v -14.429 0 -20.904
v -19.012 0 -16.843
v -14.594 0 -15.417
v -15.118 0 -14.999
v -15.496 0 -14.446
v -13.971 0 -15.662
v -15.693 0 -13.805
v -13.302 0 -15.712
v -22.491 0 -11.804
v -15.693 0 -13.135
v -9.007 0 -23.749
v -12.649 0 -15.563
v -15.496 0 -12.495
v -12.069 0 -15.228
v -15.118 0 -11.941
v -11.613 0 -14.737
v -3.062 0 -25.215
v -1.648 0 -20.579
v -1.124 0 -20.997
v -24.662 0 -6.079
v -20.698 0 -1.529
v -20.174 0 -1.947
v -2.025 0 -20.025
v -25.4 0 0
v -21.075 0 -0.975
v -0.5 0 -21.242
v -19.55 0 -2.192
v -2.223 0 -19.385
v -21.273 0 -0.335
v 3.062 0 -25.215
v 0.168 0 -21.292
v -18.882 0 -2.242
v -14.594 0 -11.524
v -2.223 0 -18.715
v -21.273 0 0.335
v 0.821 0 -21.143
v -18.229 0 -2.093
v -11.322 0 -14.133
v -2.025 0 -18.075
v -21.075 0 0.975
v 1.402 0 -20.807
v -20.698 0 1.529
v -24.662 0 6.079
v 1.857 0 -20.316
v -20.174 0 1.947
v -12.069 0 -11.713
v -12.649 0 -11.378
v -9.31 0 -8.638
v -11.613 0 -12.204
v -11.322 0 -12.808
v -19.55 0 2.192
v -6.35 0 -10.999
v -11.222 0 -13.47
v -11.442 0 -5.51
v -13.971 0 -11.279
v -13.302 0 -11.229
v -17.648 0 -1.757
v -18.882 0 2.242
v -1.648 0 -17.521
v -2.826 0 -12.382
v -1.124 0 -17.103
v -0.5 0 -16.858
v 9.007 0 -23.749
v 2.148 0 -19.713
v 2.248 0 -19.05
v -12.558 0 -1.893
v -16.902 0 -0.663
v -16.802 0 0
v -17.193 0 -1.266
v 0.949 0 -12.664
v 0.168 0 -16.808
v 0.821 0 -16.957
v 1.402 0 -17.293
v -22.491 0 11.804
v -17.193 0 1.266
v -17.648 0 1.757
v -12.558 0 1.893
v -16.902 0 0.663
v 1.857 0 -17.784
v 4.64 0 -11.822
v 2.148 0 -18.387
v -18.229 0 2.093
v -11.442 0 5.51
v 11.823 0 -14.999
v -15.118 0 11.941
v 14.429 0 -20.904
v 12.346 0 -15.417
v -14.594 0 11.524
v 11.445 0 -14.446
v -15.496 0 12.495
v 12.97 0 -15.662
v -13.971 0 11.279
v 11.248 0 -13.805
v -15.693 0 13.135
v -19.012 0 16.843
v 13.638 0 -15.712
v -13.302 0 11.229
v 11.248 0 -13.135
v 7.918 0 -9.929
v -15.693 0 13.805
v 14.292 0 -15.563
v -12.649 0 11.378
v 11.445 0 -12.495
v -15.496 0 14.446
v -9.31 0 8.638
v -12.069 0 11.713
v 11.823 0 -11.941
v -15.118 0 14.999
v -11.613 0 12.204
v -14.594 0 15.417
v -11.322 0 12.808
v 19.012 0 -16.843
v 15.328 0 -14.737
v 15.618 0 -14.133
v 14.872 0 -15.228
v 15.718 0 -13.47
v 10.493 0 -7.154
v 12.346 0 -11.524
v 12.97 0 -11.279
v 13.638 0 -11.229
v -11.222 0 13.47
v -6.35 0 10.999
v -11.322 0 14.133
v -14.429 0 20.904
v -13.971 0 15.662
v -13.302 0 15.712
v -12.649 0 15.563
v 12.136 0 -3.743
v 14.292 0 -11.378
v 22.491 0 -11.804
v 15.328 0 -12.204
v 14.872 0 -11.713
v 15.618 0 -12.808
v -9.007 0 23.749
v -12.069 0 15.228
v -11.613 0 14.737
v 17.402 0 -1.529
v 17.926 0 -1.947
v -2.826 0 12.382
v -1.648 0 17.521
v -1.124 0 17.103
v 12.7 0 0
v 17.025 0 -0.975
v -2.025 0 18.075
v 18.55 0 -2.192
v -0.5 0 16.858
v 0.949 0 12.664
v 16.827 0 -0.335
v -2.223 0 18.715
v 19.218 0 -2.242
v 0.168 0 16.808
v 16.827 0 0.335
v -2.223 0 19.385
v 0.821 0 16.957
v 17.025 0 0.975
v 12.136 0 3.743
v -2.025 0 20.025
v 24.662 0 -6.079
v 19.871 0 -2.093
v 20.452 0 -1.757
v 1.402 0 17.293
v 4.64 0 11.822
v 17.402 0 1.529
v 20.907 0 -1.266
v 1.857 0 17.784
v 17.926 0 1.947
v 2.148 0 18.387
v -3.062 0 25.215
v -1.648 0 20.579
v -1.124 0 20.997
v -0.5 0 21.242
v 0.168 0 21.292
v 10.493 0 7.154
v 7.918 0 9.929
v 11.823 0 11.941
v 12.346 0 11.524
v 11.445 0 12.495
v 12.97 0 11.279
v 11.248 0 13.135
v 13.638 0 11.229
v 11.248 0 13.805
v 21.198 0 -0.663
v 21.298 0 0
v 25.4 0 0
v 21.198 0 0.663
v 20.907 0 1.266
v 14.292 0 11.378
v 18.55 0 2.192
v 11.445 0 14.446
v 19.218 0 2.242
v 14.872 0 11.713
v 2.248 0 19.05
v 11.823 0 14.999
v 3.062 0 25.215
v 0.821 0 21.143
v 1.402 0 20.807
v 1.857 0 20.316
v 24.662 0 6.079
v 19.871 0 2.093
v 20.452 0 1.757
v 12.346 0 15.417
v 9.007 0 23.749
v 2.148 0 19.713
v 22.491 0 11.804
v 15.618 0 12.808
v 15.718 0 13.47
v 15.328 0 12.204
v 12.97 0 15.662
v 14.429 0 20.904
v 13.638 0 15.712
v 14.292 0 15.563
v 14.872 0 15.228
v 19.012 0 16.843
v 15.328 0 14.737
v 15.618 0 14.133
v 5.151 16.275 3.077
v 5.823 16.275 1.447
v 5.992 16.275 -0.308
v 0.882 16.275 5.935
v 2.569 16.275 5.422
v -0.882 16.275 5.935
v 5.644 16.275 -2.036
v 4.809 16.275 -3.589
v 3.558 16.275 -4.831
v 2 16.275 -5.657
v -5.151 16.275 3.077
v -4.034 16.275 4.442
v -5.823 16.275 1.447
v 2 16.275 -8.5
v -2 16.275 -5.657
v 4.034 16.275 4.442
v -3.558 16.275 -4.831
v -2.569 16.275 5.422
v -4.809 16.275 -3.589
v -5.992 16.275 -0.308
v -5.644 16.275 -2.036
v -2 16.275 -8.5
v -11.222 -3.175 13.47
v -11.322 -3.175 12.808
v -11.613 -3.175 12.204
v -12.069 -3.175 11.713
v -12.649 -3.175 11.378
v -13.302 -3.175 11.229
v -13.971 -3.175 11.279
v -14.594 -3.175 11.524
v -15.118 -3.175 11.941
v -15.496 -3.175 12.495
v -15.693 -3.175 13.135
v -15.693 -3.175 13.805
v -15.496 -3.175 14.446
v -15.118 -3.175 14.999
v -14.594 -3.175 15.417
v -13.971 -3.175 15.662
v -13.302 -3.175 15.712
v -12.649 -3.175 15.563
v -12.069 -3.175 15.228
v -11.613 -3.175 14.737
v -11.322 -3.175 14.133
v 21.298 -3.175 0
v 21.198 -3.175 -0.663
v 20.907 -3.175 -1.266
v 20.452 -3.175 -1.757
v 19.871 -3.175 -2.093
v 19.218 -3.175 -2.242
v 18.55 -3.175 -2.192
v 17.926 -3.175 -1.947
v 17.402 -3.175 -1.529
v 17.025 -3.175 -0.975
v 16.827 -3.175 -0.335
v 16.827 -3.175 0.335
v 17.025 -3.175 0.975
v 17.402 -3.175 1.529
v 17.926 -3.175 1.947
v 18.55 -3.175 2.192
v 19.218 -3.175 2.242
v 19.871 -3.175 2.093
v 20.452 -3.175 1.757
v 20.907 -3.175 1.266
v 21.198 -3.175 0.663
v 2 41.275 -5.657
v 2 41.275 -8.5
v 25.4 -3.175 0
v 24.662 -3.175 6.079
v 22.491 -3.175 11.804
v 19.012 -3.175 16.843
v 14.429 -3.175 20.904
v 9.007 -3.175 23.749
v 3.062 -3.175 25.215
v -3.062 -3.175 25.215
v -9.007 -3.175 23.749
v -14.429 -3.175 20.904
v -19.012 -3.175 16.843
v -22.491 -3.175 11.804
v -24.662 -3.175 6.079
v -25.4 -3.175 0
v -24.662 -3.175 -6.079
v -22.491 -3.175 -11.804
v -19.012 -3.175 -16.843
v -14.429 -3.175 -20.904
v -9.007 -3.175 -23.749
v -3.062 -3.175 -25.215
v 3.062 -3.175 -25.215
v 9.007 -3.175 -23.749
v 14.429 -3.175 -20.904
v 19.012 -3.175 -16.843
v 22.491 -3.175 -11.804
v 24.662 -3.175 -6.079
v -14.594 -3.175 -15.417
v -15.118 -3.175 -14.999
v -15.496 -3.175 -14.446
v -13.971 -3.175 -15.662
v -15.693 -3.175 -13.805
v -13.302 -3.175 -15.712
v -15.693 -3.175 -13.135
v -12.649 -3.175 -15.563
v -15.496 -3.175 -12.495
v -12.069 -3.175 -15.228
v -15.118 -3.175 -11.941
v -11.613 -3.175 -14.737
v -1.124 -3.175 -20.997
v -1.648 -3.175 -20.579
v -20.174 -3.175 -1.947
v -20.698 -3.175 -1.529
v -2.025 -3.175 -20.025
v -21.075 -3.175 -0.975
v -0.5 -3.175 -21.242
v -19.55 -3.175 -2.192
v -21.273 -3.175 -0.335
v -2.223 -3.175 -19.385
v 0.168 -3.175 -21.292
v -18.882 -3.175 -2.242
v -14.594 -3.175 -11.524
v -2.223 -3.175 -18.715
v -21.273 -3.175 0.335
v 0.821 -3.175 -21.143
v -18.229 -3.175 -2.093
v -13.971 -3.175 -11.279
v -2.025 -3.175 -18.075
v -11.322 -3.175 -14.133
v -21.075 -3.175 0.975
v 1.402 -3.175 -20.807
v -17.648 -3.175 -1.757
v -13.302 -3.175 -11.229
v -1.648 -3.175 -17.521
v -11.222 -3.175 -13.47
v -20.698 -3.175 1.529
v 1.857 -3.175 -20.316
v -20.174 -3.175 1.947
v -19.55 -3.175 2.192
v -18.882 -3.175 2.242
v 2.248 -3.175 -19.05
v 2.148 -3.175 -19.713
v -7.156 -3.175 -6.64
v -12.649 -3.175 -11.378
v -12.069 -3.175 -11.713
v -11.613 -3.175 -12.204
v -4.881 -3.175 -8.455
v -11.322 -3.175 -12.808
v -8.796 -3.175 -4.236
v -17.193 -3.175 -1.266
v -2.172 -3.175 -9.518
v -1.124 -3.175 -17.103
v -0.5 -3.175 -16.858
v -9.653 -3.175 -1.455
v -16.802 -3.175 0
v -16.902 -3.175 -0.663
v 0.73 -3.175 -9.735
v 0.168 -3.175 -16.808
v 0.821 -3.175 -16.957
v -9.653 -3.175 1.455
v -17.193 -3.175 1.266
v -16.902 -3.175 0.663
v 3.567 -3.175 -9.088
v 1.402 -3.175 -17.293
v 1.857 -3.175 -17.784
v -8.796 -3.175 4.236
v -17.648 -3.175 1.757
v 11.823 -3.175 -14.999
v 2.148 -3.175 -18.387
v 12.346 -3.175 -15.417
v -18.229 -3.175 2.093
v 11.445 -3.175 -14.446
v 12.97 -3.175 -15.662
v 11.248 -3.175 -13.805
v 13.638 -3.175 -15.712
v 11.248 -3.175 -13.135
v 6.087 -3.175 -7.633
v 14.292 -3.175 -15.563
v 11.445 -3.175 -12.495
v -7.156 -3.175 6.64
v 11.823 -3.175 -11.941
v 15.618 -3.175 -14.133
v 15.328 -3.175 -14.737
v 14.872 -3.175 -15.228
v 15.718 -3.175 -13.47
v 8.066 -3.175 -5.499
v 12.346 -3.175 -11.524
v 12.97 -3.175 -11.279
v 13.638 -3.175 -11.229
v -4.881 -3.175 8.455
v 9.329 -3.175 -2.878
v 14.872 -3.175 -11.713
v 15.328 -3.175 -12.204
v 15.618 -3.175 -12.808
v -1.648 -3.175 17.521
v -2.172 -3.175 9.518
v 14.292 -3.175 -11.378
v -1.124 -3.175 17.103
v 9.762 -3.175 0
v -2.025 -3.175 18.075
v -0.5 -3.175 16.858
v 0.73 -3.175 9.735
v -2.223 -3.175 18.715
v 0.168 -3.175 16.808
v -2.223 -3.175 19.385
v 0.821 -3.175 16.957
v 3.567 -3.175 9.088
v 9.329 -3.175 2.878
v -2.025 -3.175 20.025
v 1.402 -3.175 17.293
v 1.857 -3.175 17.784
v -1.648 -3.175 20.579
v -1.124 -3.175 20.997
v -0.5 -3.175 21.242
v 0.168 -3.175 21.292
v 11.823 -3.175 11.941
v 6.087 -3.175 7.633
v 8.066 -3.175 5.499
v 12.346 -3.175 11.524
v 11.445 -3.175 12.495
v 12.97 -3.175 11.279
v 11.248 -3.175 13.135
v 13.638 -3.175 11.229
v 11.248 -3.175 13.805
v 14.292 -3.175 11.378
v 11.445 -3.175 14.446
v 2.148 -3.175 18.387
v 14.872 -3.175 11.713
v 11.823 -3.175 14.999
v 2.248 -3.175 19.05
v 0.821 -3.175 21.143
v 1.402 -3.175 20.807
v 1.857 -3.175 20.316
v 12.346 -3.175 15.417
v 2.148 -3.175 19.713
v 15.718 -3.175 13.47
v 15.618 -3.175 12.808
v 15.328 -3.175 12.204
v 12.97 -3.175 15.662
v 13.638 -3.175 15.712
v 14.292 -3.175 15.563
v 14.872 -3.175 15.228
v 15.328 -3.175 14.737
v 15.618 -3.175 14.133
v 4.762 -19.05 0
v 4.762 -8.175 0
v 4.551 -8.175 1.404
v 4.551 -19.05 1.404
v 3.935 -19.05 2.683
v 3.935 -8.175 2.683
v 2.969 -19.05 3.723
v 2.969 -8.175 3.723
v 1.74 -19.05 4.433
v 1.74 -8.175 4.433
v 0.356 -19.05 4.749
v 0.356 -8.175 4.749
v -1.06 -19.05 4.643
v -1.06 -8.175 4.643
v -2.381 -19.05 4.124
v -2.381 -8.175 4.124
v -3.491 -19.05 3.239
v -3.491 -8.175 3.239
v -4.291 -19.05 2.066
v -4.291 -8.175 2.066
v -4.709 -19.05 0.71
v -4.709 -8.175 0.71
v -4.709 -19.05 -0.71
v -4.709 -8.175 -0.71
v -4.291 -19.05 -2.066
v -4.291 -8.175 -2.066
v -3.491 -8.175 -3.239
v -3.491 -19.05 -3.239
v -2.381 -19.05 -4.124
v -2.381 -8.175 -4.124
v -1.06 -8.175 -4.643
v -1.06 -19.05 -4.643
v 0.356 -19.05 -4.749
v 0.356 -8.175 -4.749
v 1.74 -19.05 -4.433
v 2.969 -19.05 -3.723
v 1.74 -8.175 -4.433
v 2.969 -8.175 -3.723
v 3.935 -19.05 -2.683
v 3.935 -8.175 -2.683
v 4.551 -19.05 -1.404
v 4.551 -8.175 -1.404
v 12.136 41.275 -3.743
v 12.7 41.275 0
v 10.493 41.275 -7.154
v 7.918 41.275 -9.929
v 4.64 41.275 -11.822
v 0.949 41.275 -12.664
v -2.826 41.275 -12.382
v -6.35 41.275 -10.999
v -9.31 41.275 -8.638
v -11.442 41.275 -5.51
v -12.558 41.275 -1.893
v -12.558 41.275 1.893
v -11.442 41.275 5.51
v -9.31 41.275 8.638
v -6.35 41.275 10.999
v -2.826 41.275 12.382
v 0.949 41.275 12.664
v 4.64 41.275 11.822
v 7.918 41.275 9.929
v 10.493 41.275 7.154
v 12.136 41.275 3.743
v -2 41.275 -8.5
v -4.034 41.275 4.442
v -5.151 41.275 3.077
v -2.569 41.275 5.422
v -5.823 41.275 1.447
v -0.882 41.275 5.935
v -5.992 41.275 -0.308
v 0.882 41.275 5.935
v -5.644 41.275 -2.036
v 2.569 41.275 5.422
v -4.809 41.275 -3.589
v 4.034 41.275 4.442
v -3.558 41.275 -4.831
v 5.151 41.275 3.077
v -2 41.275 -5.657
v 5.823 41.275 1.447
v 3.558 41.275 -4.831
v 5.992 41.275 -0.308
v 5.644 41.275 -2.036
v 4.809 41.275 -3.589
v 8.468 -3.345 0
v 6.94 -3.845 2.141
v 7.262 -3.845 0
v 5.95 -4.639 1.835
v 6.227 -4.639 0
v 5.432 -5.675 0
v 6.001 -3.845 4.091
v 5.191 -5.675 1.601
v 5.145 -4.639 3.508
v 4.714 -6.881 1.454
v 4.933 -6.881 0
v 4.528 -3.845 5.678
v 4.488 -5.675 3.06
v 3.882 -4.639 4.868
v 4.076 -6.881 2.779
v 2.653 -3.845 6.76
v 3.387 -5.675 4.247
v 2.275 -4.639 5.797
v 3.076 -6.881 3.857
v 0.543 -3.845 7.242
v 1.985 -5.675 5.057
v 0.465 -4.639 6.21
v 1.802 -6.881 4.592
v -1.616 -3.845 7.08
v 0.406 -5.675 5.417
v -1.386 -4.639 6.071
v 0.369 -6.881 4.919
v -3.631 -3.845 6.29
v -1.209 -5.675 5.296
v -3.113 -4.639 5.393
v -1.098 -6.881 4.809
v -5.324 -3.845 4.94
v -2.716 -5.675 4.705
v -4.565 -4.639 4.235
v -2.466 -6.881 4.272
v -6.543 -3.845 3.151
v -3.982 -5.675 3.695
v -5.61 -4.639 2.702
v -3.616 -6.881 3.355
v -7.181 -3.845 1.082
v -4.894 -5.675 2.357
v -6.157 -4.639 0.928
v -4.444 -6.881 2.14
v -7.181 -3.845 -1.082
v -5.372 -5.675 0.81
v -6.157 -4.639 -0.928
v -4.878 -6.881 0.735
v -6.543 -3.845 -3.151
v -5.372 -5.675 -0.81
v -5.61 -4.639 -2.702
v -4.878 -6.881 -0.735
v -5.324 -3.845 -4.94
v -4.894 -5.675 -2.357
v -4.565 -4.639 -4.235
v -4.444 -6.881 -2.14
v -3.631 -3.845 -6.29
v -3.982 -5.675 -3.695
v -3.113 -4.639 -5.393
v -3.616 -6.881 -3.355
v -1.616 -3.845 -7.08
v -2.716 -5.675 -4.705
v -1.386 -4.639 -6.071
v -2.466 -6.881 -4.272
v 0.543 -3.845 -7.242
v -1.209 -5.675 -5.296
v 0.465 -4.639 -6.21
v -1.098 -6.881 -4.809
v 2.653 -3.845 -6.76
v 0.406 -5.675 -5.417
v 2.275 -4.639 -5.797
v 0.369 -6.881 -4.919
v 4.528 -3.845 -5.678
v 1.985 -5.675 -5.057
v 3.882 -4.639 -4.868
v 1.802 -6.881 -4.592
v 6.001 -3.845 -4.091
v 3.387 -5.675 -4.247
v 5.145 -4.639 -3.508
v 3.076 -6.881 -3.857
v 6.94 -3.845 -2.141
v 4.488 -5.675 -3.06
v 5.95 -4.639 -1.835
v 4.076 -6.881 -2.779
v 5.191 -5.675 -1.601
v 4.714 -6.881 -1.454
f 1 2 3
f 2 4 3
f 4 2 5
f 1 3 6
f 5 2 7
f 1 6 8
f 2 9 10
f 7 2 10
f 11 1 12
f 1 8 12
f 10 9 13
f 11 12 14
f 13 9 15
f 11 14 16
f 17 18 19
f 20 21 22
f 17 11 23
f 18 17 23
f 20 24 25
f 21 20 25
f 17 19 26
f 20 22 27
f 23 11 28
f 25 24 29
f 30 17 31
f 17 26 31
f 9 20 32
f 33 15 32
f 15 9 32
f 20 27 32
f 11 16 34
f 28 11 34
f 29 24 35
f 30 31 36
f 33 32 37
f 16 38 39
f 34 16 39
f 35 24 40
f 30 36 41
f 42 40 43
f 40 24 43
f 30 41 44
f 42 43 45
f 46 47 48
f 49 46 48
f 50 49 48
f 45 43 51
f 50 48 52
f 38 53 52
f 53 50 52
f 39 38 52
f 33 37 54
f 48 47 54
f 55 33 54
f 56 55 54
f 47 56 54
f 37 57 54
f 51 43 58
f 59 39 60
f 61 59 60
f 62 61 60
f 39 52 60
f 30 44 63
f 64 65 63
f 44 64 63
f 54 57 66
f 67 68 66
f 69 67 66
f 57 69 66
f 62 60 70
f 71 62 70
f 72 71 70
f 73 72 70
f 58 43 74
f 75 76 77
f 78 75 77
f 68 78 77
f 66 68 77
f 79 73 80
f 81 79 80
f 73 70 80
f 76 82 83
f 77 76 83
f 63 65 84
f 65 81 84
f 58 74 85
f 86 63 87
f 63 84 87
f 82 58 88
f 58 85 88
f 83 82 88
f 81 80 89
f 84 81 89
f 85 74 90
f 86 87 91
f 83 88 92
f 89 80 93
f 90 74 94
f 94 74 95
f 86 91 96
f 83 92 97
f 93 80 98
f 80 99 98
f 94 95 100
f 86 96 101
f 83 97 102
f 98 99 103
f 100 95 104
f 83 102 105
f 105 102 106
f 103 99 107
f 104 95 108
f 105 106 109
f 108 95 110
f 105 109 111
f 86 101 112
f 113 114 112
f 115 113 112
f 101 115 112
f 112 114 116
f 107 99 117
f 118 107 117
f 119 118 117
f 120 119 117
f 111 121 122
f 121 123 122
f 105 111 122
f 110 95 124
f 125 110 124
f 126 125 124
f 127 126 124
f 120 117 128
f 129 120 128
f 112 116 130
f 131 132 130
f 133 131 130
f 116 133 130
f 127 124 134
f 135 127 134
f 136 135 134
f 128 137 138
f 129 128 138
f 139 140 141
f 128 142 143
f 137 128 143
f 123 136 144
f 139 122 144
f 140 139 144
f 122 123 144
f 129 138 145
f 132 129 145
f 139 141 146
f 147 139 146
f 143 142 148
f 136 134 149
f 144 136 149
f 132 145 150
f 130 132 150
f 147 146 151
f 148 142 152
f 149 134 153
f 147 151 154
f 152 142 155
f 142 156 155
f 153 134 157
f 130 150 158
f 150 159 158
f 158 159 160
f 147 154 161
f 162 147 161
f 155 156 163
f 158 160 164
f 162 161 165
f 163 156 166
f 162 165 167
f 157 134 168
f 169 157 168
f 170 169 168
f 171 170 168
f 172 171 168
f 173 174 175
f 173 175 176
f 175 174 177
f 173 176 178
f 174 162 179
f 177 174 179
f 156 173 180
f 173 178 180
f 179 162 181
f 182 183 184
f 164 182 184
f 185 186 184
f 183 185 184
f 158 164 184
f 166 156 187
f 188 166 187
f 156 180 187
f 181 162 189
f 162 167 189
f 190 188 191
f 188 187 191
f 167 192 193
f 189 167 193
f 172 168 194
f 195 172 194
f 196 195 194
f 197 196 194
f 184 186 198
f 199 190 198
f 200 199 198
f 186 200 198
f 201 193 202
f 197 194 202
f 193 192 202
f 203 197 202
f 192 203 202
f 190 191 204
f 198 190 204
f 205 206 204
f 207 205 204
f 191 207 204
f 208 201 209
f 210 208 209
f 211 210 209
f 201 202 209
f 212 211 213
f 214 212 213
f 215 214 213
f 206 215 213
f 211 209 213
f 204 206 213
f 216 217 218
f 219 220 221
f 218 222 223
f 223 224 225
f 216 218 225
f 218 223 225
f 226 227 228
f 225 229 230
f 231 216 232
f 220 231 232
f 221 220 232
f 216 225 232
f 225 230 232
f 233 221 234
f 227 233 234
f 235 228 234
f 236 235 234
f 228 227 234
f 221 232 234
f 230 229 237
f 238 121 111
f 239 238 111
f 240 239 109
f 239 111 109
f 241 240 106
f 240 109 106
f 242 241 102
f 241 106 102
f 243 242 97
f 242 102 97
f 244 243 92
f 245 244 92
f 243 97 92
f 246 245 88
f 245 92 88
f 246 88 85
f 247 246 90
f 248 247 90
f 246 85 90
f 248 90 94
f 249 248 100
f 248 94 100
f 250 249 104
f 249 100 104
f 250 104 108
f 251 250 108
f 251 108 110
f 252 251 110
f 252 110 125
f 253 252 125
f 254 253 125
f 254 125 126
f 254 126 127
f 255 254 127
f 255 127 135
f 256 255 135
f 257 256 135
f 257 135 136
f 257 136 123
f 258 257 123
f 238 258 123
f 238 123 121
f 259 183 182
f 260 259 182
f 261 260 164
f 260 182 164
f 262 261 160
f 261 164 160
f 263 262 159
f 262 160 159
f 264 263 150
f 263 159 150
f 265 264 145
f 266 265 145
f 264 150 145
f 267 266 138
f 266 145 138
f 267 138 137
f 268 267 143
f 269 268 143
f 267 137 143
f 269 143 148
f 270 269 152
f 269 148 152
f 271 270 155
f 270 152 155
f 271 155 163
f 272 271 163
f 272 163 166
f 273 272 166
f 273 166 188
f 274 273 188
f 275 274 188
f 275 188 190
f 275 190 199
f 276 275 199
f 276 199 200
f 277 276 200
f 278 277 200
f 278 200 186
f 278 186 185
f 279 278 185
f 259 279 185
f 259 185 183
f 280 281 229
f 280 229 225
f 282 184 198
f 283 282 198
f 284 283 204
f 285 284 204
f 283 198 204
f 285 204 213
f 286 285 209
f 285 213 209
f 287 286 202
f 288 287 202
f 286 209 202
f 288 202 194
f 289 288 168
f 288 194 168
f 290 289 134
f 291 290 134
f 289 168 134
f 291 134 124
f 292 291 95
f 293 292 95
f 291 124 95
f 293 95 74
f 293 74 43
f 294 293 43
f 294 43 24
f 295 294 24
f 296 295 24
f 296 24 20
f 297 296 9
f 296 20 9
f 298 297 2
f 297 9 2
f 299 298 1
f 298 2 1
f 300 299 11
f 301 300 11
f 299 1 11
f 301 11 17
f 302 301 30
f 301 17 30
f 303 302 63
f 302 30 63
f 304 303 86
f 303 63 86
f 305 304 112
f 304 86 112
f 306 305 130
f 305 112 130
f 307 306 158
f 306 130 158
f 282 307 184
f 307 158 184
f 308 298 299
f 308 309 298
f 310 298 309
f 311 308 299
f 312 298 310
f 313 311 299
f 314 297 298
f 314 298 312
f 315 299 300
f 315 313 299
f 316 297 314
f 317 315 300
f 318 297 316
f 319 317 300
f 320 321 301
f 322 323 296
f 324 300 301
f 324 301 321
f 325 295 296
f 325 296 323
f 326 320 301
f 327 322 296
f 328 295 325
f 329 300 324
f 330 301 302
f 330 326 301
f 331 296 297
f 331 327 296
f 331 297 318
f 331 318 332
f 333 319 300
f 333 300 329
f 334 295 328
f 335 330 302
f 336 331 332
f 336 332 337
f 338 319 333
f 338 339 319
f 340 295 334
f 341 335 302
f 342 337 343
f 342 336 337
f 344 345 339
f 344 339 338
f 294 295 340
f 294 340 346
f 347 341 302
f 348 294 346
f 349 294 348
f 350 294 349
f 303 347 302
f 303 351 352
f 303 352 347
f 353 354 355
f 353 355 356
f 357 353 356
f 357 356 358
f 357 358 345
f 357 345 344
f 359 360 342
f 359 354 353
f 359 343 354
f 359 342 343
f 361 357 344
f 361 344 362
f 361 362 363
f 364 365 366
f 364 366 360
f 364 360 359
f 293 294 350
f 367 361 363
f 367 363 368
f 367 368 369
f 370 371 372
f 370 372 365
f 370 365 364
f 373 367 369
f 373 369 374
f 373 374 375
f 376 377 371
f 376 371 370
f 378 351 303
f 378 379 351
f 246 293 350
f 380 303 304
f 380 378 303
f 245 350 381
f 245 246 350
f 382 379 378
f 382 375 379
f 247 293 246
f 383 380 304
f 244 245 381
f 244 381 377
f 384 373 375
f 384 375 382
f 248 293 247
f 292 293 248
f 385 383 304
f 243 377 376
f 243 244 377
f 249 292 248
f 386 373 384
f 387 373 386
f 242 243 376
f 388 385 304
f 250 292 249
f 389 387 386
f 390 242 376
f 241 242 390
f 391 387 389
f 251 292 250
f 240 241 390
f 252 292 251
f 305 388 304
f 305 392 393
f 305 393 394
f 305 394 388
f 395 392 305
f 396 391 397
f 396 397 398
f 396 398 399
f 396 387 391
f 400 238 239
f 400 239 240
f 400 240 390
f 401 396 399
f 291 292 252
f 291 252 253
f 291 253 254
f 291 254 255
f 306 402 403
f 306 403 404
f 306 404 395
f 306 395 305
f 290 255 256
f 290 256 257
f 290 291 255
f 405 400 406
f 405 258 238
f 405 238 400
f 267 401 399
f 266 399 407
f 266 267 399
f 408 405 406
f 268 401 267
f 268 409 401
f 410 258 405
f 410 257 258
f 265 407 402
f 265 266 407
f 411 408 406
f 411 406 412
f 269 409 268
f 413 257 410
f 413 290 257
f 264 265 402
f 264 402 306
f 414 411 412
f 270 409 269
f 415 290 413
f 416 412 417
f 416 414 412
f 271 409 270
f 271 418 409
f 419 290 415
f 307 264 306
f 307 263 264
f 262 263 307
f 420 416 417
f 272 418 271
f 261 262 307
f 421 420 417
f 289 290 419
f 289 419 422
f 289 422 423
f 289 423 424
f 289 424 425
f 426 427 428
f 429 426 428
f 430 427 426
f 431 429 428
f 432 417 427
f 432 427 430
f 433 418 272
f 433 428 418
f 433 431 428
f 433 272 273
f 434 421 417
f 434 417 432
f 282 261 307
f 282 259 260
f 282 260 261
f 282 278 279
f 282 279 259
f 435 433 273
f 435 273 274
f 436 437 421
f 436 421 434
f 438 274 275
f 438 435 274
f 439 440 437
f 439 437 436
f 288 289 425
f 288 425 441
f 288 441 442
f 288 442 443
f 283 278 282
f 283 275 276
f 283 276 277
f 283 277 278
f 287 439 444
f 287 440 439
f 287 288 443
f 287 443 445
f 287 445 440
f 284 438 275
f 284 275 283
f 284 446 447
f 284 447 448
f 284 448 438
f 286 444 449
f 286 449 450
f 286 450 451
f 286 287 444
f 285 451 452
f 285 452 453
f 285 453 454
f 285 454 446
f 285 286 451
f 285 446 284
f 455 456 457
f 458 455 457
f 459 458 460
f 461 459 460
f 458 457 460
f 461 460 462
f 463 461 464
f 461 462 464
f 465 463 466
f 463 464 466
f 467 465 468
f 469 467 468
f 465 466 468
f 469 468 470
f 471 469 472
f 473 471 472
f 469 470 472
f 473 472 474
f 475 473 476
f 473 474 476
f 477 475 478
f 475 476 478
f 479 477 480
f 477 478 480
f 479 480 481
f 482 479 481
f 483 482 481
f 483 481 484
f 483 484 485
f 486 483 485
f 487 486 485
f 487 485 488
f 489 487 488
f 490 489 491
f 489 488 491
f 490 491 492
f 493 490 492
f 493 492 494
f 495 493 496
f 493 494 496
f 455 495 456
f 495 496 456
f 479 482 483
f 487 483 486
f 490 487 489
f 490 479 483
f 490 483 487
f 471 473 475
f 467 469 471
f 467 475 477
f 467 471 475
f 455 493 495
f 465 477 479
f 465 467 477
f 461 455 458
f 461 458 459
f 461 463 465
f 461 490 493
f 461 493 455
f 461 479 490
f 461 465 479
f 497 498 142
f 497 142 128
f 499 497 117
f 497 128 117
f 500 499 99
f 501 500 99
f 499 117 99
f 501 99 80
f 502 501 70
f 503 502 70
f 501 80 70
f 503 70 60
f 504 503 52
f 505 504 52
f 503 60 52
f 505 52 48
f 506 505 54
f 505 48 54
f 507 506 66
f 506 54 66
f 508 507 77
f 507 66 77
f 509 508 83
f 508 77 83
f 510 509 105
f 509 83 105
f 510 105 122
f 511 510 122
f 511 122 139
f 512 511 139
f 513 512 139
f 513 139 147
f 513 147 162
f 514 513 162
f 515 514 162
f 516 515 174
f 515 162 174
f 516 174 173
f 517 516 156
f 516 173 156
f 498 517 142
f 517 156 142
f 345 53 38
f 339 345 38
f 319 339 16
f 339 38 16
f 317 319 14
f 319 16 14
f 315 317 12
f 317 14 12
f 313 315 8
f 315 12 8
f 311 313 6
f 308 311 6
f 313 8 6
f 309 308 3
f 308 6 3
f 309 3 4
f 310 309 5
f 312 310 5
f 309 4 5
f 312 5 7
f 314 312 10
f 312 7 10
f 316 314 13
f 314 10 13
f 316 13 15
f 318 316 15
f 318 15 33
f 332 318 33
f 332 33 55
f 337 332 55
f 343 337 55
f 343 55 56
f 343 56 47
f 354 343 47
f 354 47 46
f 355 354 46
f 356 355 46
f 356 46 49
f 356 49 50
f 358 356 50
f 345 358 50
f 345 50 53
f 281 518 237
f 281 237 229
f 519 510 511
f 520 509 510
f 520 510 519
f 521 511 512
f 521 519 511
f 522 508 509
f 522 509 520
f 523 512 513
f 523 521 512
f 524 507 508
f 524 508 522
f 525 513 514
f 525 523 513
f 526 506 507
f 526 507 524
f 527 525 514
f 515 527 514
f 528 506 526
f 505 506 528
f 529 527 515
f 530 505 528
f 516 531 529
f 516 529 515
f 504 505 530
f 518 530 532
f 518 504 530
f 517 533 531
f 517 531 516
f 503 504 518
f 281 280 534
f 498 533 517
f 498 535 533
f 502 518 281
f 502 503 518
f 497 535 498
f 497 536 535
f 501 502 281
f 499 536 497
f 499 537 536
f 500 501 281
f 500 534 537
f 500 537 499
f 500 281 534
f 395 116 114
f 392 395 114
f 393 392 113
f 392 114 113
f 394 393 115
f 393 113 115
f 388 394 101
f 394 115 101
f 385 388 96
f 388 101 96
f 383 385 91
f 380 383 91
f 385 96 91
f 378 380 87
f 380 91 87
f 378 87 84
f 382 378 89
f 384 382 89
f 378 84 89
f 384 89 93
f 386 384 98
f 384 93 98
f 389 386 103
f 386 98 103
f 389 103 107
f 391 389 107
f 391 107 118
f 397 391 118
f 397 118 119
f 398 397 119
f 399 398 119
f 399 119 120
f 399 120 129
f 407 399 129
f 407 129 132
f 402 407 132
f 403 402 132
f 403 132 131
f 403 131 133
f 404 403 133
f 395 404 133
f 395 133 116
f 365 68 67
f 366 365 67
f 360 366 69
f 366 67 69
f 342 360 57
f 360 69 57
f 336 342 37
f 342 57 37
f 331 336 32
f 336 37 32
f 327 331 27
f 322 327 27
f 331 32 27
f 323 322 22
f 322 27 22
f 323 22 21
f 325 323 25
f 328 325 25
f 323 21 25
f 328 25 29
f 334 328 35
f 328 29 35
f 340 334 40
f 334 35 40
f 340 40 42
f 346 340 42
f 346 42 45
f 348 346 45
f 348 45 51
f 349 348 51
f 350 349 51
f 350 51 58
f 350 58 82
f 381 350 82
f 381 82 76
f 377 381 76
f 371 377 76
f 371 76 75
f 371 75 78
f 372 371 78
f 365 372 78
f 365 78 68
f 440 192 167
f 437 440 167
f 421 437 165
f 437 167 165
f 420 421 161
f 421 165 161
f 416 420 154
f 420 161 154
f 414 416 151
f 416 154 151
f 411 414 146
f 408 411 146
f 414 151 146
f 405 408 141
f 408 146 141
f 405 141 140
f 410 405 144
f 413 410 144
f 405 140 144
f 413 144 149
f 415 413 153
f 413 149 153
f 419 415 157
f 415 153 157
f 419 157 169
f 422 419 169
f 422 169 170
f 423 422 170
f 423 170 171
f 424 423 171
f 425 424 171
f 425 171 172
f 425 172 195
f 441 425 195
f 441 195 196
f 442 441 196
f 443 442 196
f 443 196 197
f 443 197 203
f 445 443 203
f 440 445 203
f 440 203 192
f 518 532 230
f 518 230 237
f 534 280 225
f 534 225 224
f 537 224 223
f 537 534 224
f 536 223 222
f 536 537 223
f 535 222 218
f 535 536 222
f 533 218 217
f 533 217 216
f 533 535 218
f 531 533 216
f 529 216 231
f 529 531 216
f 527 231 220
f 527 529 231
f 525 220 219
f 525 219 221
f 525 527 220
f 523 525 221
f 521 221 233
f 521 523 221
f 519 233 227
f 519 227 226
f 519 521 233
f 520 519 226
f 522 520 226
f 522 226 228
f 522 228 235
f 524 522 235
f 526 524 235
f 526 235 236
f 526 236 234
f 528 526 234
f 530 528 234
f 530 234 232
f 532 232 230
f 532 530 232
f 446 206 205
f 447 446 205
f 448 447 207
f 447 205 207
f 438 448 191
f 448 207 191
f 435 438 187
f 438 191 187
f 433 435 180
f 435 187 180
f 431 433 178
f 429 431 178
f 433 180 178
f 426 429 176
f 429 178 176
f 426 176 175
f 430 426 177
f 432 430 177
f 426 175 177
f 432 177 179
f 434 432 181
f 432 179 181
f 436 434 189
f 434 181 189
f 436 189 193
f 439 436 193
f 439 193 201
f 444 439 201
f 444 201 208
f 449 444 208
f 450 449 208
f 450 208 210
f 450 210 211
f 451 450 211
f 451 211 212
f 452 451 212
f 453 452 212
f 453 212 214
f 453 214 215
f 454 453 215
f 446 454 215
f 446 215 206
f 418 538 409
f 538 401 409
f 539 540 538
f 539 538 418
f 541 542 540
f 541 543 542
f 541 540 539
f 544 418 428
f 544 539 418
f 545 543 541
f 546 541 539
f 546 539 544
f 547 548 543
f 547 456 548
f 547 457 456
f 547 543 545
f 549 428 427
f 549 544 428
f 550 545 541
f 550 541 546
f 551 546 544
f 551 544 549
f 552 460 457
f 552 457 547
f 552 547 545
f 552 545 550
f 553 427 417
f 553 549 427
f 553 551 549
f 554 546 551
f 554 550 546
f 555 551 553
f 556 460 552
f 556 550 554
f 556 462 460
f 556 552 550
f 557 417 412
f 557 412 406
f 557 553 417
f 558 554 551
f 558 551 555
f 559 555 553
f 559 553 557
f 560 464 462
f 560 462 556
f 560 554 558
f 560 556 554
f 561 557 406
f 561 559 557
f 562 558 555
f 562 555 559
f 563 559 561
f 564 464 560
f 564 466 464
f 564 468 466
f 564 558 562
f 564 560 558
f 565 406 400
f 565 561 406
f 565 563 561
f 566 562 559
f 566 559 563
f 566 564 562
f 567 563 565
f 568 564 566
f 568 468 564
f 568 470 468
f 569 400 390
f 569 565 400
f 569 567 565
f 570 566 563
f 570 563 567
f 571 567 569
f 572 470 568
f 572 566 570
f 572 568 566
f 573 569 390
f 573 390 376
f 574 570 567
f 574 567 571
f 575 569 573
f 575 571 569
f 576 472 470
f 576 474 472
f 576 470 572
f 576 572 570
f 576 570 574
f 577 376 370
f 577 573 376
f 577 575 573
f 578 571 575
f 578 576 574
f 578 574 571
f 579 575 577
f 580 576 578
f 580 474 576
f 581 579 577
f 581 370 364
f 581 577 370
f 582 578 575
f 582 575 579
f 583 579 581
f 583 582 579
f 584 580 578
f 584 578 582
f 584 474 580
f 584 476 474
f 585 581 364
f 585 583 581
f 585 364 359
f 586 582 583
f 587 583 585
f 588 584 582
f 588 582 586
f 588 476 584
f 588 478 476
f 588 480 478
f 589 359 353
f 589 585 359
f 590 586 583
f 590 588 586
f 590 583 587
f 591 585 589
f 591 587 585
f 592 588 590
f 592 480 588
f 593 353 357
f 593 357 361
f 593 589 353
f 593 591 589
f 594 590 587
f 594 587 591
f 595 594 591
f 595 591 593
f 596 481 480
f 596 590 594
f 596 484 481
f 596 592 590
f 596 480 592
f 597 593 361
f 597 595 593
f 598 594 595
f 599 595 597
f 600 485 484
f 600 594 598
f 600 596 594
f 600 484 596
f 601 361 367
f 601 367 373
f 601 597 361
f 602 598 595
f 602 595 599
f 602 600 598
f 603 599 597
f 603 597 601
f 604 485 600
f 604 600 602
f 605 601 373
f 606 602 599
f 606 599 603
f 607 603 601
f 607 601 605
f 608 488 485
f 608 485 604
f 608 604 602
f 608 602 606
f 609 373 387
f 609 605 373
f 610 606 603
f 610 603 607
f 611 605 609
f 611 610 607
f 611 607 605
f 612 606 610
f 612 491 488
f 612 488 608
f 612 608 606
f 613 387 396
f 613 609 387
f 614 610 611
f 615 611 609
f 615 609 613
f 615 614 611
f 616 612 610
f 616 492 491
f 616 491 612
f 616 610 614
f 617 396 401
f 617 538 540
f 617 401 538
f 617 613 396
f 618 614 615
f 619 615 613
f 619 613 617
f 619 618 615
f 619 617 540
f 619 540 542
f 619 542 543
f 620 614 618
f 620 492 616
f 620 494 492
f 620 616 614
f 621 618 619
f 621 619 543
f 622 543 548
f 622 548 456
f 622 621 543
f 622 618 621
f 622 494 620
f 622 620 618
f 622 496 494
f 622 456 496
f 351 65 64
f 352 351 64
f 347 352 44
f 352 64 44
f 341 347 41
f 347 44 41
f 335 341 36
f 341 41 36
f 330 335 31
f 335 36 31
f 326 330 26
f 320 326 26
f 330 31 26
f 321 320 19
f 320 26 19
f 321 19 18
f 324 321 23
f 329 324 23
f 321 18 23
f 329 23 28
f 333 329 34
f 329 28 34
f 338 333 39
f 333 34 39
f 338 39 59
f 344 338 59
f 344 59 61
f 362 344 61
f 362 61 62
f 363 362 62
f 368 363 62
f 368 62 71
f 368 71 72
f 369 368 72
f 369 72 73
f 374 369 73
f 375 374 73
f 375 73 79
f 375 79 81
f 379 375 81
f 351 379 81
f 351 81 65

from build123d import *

# Parameters (mm, degrees)
SKETCH1_R                   = 12.7
BOSS_EXTRUDE1_DEPTH         = 41.275
SKETCH3_R                   = 25.4
BOSS_EXTRUDE3_DEPTH         = 3.175
F_8_CLEARANCE_HOLE1_D       = 4.4958
F_20_8MMTOENDOFKEYWAY_DEPTH = 25
SKETCH8_R                   = 4.7625
BOSS_EXTRUDE4_DEPTH         = 15.875
FILLET1_R                   = 5


with BuildPart() as part:
    # Sketch1 → Boss-Extrude1 (new body)
    with BuildSketch(Plane(origin=(0, 0, 0), x_dir=(1, 0, 0), z_dir=(0, 1, 0))):
        Circle(SKETCH1_R)
    extrude(amount=BOSS_EXTRUDE1_DEPTH)

    # Sketch3 → Boss-Extrude3 (add)
    with BuildSketch(Plane.XZ):
        Circle(SKETCH3_R)
    extrude(amount=BOSS_EXTRUDE3_DEPTH)

    # #8 Clearance Hole1 (through all)
    with Locations(Plane(origin=(0, -3.175, 0), x_dir=(-1, 0, 0), z_dir=(0, -1, 0))):
        with Locations((0, 19.05), (-13.470384182, 13.470384182), (-19.05, 0), (-13.470384182, -13.470384182), (0, -19.05), (13.470384182, -13.470384182), (19.05, 0), (13.470384182, 13.470384182)):
            Hole(F_8_CLEARANCE_HOLE1_D / 2)

    # Sketch7 → 20.8mmToEndofKeyway (cut)
    with BuildSketch(Plane(origin=(0, 41.275, 0), x_dir=(1, 0, 0), z_dir=(0, 1, 0))):
        with BuildLine():
            Line((-2, 8.5), (2, 8.5))
            Line((2, 8.5), (2, 5.656854249))
            ThreePointArc((2, 5.656854249), (0, -6), (-2, 5.656854249))
            Line((-2, 5.656854249), (-2, 8.5))
        make_face()
    extrude(amount=-F_20_8MMTOENDOFKEYWAY_DEPTH, mode=Mode.SUBTRACT)

    # Sketch8 → Boss-Extrude4 (add)
    with BuildSketch(Plane.XZ.offset(3.175)):
        Circle(SKETCH8_R)
    extrude(amount=BOSS_EXTRUDE4_DEPTH)

    # Fillet1
    fillet1_edges = [part.edges().sort_by_distance(p)[0] for p in [
        (-4.7625, -3.175, 0),
    ]]
    fillet(fillet1_edges, radius=FILLET1_R)


solid = part.part
